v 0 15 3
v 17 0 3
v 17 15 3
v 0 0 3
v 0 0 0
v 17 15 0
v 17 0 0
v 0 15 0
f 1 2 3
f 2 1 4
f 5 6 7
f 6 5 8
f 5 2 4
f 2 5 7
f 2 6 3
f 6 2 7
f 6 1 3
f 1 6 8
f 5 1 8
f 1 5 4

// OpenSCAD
// Generated by SolidPython 1.0.1 on 2020-07-29 00:46:56


cube(size = [17, 15, 3]);
/***********************************************
*********      SolidPython code:      **********
************************************************
 
# import packages: SolidPython
from solid import *
from solid.utils import *
from itertools import chain, combinations, permutations


class Resize:

    def __init__(self, scad_file):
        self.scad_file = scad_file
        #self.scad_file = import_scad(scad_file)
        # cone/cylinder param:
        self.r1 = 0
        self.r2 = 0
        self.h = 0
        # rectangular prism param:
        self.w = 0
        self.l = 0
        # ellipse param:
        self.r = 0

    # import OpenScad code (file name corresponds to shape)


    # classify shape + parameters
    def assign(self, param1, param2, param3):
        if self.scad_file == 'cone.scad':
            self.r1 = param1
            self.r2 = param2
            self.h = param3
        elif self.scad_file == 'cylinder.scad':
            self.r1 = param1
            self.r2 = param2
            self.h = param3
        elif self.scad_file == 'rectangularPrism.scad':
            self.h = param1
            self.l = param2
            self.w = param3
        else:
            self.r = param1
            self.h = param2

    # resize parameters
    def iterate(self):
        x = range(3, 20, 2)
        i = 1
        if self.scad_file == 'cone.scad':
            tempList = list(permutations(x, 2))
            for temp in tempList:
                param1 = temp[0]
                param2 = temp[1]
                filepath = 'produced_scad_files/' + 'cone' + str(param1) + '_' + str(param2) + '_' + '.scad'
                scad_render_to_file(cylinder(h=param1, r1=param2, r2=0), filepath)

        elif self.scad_file == 'cylinder.scad':
            tempList = list(permutations(x, 3))
            for temp in tempList:
                param1 = temp[0]
                param2 = temp[1]
                filepath = 'produced_scad_files/' + 'cylinder' + str(param1) + '_' + str(param2) + '_' + '.scad'
                scad_render_to_file(cylinder(h=param1, r1=param2, r2=param2), filepath)

        elif self.scad_file == 'rectangularPrism.scad':
            tempList = list(permutations(x, 3))
            for temp in tempList:
                param1 = temp[0]
                param2 = temp[1]
                param3 = temp[2]
                filepath = 'produced_scad_files/' + 'rectangularPrism' + str(param1) + '_' + str(param2) + '_' + str(
                    param3) + '.scad'
                scad_render_to_file(cube(size=(param1, param2, param3)), filepath)

        elif self.scad_file == 'ellipse.scad':
            tempList = list(permutations(x, 4))
            for temp in tempList:
                param1 = temp[0]
                param2 = temp[1]
                param3 = temp[2]
                param4 = temp[3]
                filepath = 'produced_scad_files/' + 'ellipse' + str(param1) + '_' + str(param2) + '_' + str(param3) + '_' + str(param4) + '.scad'
                scad_render_to_file(scale([param1, param2, param3])(sphere(r=param4)), filepath)

    def render_to_scadfile(self):
        scad_render_to_file(scad, 'example.scad') 
 
************************************************/
